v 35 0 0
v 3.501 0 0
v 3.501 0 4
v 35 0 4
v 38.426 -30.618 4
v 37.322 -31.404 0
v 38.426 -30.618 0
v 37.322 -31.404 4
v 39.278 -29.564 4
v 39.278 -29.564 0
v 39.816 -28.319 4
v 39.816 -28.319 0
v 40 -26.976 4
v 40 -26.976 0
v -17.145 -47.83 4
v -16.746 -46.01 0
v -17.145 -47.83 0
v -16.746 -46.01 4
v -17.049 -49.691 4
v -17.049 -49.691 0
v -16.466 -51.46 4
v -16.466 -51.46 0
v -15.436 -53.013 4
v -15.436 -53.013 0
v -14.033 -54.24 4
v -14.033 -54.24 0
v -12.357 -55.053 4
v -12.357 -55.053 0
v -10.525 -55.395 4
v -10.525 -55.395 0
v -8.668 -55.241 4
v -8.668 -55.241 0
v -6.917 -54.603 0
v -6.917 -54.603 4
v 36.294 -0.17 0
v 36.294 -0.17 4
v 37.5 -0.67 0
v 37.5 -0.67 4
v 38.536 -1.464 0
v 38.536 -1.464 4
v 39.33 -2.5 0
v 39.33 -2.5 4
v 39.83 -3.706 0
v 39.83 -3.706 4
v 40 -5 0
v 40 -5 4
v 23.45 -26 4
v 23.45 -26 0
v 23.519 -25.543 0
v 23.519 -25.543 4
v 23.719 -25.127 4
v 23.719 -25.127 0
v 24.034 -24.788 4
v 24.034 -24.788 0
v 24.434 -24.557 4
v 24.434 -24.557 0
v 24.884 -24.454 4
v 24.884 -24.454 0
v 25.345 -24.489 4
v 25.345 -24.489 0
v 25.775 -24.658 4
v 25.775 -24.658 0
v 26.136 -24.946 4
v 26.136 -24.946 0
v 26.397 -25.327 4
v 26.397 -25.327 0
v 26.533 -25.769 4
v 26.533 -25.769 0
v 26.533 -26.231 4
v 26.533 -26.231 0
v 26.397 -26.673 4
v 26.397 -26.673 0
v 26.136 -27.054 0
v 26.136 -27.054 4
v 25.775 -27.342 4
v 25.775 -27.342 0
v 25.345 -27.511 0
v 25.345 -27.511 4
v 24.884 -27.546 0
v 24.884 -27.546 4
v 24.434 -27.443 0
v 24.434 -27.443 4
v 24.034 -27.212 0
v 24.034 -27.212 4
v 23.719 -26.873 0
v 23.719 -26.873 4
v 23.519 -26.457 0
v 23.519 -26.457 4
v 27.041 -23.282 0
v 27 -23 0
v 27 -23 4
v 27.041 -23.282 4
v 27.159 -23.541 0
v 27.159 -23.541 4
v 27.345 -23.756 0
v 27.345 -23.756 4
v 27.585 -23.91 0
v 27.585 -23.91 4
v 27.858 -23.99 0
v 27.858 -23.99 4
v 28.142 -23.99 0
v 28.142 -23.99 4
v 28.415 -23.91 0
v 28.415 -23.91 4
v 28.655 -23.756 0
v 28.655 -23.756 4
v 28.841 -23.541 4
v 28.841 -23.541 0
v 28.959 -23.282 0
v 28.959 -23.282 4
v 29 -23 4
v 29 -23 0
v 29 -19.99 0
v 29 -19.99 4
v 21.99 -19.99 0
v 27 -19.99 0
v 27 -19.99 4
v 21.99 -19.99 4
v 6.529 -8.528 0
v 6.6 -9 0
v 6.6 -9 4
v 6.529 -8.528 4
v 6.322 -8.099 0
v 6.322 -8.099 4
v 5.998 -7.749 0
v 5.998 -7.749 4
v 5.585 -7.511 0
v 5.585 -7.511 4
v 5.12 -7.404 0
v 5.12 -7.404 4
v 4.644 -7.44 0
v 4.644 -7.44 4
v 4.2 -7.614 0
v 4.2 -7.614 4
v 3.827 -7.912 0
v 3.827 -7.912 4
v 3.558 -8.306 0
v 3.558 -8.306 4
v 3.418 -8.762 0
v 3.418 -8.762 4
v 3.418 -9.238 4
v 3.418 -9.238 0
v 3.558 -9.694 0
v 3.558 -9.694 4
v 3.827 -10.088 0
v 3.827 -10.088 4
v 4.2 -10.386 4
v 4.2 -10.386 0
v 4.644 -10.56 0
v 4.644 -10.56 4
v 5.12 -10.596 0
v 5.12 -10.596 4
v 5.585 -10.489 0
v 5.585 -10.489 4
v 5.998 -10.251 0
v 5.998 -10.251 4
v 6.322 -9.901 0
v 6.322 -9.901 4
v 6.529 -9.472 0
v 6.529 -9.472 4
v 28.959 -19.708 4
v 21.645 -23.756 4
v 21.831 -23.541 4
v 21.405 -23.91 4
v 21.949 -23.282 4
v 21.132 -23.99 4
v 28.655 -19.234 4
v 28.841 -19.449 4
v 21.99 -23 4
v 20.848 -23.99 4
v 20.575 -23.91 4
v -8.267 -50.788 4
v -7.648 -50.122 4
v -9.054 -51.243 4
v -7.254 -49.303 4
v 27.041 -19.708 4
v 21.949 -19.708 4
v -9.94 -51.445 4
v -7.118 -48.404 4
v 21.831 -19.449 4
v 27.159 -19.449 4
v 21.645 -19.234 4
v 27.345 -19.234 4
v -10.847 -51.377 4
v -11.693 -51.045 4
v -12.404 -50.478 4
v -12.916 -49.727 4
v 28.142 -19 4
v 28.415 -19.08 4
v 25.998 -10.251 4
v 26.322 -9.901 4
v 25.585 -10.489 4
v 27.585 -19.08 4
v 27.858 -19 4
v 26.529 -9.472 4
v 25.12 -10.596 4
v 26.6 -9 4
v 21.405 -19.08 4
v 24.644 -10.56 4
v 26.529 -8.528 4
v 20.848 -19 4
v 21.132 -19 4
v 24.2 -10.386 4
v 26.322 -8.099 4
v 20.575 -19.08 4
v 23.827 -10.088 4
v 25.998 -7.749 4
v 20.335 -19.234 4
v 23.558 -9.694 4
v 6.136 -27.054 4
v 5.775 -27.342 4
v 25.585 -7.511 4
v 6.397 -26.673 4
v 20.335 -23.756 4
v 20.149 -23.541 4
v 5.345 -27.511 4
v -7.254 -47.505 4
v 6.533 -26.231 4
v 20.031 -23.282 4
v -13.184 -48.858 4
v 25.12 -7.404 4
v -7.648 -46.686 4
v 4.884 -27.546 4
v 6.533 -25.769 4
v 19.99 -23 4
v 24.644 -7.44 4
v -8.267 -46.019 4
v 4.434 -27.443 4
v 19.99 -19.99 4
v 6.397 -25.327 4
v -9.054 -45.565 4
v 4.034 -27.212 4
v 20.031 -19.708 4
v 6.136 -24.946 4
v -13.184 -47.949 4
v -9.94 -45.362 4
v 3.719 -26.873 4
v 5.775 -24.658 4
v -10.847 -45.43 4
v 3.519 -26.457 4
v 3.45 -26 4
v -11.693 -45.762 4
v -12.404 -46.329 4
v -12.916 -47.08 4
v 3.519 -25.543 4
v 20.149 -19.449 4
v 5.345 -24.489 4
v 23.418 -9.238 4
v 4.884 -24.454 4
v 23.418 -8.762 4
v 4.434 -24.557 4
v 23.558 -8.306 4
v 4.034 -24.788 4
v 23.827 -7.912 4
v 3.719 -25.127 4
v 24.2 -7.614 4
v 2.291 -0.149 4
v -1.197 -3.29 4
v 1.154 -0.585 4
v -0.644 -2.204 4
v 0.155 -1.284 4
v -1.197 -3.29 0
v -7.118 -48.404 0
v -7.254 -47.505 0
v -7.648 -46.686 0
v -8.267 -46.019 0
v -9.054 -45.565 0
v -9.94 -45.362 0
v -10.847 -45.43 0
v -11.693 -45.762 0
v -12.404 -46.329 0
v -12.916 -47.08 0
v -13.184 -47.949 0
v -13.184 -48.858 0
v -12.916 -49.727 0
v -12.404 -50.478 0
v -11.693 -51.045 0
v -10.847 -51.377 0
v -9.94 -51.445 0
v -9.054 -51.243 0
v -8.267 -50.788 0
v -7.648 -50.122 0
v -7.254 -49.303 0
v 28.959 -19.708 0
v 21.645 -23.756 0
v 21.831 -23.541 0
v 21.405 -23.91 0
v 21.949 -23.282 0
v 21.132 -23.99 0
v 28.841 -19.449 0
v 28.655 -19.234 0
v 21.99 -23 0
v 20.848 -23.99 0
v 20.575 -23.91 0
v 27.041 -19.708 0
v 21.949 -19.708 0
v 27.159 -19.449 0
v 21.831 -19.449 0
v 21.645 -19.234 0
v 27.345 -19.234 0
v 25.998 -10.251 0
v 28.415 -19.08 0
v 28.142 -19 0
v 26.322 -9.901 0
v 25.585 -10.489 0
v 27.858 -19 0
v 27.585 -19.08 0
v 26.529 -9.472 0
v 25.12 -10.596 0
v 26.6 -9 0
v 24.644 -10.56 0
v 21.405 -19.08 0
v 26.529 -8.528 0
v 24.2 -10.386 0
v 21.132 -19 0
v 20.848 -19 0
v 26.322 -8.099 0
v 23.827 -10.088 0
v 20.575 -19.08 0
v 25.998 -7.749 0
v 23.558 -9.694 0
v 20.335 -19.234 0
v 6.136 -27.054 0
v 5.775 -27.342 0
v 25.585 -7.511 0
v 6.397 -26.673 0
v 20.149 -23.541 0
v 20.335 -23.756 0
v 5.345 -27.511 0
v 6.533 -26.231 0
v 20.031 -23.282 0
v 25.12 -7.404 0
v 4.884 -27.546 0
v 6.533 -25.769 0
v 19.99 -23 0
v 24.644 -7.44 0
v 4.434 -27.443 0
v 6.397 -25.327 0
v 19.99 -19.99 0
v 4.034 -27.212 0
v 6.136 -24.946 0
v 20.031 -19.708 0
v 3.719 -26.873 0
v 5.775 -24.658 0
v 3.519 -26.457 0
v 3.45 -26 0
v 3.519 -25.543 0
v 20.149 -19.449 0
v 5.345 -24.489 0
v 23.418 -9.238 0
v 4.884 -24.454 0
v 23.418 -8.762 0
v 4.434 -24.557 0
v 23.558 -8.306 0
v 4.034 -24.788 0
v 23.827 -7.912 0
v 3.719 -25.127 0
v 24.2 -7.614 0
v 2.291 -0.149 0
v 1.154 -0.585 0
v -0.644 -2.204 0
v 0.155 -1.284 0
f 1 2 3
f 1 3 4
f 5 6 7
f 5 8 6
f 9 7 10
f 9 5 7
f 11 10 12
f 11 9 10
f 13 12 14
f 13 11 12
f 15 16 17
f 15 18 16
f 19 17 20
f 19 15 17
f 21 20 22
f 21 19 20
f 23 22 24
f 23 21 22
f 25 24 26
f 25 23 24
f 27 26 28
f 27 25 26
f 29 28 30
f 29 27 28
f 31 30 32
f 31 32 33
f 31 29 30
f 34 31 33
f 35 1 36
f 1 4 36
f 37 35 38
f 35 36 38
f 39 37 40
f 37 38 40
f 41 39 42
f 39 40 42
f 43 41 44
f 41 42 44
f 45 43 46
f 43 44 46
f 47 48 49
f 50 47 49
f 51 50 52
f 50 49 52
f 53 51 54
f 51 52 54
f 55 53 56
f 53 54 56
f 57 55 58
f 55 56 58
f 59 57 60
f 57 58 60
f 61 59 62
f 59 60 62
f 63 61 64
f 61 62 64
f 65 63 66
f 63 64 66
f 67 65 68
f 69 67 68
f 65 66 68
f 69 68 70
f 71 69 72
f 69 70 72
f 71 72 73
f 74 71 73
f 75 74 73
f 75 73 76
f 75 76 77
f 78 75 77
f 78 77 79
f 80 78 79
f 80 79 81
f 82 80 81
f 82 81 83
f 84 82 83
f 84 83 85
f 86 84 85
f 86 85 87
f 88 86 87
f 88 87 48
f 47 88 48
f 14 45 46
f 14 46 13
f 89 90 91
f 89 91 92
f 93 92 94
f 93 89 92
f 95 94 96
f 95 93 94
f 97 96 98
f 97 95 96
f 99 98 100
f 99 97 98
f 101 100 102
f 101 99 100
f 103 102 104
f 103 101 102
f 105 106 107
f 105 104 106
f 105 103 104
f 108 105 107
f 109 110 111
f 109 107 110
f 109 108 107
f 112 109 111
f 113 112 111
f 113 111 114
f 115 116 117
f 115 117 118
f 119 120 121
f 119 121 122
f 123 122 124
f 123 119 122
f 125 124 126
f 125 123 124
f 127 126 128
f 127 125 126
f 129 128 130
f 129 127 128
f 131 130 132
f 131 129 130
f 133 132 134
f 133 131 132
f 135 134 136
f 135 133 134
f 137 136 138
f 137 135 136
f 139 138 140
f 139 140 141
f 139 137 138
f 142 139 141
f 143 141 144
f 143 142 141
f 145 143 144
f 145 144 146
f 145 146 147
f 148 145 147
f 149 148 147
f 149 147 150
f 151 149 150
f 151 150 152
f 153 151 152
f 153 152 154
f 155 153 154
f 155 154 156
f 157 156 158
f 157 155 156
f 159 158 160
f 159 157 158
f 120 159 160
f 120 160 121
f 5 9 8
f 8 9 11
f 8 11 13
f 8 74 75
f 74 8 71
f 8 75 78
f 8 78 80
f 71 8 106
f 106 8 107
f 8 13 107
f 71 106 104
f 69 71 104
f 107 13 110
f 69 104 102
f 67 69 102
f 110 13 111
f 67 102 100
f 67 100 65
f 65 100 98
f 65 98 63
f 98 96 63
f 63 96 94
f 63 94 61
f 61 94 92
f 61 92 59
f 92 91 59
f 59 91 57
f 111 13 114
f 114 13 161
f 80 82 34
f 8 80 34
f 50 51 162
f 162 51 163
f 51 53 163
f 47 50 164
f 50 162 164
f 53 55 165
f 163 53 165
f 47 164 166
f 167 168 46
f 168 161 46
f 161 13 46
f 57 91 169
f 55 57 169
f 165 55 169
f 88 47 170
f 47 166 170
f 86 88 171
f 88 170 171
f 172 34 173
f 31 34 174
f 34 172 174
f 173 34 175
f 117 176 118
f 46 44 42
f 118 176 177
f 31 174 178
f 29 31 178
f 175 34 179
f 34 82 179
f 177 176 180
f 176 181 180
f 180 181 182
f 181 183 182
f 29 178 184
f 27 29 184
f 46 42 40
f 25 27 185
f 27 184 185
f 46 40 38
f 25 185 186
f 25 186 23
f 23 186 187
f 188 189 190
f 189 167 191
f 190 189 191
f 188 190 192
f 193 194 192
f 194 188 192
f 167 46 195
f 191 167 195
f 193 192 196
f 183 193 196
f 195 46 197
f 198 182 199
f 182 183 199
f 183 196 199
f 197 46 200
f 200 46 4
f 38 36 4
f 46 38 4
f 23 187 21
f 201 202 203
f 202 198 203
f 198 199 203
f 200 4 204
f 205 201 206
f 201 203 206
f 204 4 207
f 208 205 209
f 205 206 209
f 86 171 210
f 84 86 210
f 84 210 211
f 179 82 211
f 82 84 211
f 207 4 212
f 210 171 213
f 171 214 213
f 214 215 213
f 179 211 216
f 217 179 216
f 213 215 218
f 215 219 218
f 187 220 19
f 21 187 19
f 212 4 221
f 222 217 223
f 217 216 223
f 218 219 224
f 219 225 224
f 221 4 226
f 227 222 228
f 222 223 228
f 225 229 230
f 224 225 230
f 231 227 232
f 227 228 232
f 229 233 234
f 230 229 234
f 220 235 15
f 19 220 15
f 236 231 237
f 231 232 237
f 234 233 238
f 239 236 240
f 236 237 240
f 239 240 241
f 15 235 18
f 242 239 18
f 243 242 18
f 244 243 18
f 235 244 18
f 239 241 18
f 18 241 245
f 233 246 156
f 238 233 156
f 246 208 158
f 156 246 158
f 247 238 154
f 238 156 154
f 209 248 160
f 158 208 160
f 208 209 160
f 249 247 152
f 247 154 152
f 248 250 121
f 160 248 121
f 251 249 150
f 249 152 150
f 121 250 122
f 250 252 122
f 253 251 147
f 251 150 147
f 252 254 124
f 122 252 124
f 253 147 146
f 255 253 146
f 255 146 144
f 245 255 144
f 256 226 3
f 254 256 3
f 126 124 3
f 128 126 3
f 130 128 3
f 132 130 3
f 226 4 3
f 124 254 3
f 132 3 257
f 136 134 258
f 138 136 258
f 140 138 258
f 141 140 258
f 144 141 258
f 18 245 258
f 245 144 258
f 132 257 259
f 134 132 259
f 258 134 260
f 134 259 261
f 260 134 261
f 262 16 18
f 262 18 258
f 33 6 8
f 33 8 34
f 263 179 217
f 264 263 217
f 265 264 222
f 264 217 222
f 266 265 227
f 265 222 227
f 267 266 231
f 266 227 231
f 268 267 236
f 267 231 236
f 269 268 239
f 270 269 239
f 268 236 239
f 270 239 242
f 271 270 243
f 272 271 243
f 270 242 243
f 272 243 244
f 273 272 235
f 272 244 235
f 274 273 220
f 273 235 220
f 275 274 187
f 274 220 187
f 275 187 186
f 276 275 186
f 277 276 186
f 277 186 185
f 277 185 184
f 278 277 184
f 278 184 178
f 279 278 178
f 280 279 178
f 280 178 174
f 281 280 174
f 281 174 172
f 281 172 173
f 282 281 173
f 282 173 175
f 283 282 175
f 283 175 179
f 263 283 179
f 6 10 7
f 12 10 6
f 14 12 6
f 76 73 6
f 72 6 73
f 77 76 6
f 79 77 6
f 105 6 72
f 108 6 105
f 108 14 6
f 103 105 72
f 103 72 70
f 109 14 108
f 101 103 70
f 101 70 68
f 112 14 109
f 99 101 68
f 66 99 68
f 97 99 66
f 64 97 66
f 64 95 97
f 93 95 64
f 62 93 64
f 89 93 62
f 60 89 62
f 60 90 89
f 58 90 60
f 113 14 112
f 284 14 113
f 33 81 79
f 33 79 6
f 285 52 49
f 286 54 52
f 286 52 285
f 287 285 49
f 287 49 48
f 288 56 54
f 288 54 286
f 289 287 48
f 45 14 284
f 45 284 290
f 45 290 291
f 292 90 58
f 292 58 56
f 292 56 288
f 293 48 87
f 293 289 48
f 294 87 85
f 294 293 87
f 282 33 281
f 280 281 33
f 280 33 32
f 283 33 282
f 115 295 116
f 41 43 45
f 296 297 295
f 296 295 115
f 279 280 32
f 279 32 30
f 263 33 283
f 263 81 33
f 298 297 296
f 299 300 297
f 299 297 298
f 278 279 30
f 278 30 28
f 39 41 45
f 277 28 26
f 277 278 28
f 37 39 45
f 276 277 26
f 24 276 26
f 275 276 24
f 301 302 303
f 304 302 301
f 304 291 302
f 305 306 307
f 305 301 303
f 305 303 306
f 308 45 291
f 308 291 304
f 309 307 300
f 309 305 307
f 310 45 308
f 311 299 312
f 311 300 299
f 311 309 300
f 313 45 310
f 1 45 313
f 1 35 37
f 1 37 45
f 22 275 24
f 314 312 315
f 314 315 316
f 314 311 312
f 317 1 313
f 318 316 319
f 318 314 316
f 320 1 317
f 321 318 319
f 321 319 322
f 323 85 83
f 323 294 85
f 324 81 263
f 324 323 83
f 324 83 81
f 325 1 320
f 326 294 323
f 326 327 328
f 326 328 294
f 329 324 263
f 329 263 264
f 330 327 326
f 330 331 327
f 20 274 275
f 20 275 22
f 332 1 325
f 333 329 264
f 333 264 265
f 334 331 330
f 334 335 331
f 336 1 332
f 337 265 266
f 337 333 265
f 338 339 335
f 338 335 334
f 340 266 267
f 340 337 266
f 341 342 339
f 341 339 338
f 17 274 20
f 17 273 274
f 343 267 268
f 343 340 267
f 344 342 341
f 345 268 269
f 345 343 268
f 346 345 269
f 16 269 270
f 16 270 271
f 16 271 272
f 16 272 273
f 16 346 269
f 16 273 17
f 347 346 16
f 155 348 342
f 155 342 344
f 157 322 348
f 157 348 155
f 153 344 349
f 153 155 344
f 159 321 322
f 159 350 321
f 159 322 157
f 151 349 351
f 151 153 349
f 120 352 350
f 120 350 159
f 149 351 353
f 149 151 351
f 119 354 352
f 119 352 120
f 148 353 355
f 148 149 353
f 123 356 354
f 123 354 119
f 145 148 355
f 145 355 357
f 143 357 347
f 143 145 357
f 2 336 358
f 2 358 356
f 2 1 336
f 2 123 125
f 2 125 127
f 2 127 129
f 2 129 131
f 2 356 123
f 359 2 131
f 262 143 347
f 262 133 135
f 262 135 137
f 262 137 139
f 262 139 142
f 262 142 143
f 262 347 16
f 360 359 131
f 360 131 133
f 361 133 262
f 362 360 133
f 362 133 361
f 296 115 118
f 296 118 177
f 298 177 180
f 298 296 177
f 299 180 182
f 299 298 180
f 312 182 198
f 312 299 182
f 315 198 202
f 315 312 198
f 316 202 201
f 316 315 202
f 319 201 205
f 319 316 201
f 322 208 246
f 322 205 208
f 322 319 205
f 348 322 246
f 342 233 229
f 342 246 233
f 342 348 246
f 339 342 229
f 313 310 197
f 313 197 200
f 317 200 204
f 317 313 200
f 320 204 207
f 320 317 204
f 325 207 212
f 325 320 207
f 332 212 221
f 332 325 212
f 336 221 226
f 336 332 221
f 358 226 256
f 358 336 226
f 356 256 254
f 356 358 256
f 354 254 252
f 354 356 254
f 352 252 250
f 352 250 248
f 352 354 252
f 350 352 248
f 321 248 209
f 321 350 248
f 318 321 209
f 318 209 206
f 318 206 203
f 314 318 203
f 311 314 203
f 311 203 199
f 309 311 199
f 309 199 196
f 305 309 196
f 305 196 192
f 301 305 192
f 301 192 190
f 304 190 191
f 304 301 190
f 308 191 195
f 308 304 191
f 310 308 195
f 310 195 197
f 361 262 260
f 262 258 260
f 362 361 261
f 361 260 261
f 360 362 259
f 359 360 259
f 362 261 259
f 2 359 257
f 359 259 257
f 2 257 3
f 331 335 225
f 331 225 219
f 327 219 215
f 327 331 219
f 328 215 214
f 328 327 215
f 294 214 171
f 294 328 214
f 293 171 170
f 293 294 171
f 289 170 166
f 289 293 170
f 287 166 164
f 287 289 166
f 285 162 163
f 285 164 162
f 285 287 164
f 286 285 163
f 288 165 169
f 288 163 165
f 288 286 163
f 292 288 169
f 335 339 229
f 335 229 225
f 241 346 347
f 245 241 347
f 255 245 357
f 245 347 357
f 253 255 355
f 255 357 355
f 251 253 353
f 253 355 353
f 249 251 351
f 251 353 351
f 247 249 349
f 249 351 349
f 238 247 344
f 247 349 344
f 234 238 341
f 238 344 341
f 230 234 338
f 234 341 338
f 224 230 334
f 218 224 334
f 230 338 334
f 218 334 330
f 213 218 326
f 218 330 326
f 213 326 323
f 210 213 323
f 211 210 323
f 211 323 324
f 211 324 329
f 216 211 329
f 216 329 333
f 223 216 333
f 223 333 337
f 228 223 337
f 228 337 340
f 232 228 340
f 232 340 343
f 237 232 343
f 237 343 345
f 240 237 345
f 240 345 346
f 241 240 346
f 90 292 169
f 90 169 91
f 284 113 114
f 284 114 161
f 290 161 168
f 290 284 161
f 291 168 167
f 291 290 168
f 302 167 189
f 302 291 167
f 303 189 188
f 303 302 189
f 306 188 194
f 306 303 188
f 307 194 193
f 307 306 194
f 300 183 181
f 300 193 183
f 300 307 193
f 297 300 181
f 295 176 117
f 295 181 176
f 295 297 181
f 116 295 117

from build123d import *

# Parameters (mm, degrees)
SKETCH_1_R          = 1.6
EXTRUDE_1_DEPTH     = 4
FILLET_1_R          = 7
SKETCH_2_R          = 3.05
CUT_EXTRUDE_1_DEPTH = 5.5
FILLET_2_R          = 5
SKETCH_4_R          = 1.55
CUT_EXTRUDE_3_DEPTH = 5


with BuildPart() as part:
    # 草图1 → 凸台-拉伸1 (new body)
    with BuildSketch(Plane.XY):
        Polygon((0, 0), (40, 0), (40, -30), (-22.930124759, -63), align=None)
        with Locations((5, -9)):
            Circle(SKETCH_1_R, mode=Mode.SUBTRACT)
        with Locations((25, -9)):
            Circle(SKETCH_1_R, mode=Mode.SUBTRACT)
    extrude(amount=EXTRUDE_1_DEPTH)

    # 圆角1
    fillet_1_edges = [part.edges().sort_by_distance(p)[0] for p in [
        (-22.930124759, -63, 2),
    ]]
    fillet(fillet_1_edges, radius=FILLET_1_R)

    # 草图2 → 切除-拉伸1 (cut)
    with BuildSketch(Plane.XY.offset(4)):
        with Locations((-10.168271669, -48.403727607)):
            Circle(SKETCH_2_R)
    extrude(amount=-CUT_EXTRUDE_1_DEPTH, mode=Mode.SUBTRACT)

    # 圆角2
    fillet_2_edges = [part.edges().sort_by_distance(p)[0] for p in [
        (0, 0, 2),
        (40, 0, 2),
        (40, -30, 2),
    ]]
    fillet(fillet_2_edges, radius=FILLET_2_R)

    # 草图4 → 切除-拉伸3 (cut)
    with BuildSketch(Plane(origin=(0, 0, 0), x_dir=(-1, 0, 0), z_dir=(0, 0, -1))):
        with Locations((-25, -26)):
            Circle(SKETCH_4_R)
        with Locations((-5, -26)):
            Circle(SKETCH_4_R)
        with BuildLine():
            Line((-21.99, -23), (-27, -23))
            ThreePointArc((-27, -23), (-28, -24), (-29, -23))
            Line((-29, -23), (-29, -19.99))
            ThreePointArc((-29, -19.99), (-28, -18.99), (-27, -19.99))
            Line((-27, -19.99), (-21.99, -19.99))
            ThreePointArc((-21.99, -19.99), (-20.99, -18.99), (-19.99, -19.99))
            Line((-19.99, -19.99), (-19.99, -23))
            ThreePointArc((-19.99, -23), (-20.99, -24), (-21.99, -23))
        make_face()
    extrude(amount=-CUT_EXTRUDE_3_DEPTH, mode=Mode.SUBTRACT)


solid = part.part
